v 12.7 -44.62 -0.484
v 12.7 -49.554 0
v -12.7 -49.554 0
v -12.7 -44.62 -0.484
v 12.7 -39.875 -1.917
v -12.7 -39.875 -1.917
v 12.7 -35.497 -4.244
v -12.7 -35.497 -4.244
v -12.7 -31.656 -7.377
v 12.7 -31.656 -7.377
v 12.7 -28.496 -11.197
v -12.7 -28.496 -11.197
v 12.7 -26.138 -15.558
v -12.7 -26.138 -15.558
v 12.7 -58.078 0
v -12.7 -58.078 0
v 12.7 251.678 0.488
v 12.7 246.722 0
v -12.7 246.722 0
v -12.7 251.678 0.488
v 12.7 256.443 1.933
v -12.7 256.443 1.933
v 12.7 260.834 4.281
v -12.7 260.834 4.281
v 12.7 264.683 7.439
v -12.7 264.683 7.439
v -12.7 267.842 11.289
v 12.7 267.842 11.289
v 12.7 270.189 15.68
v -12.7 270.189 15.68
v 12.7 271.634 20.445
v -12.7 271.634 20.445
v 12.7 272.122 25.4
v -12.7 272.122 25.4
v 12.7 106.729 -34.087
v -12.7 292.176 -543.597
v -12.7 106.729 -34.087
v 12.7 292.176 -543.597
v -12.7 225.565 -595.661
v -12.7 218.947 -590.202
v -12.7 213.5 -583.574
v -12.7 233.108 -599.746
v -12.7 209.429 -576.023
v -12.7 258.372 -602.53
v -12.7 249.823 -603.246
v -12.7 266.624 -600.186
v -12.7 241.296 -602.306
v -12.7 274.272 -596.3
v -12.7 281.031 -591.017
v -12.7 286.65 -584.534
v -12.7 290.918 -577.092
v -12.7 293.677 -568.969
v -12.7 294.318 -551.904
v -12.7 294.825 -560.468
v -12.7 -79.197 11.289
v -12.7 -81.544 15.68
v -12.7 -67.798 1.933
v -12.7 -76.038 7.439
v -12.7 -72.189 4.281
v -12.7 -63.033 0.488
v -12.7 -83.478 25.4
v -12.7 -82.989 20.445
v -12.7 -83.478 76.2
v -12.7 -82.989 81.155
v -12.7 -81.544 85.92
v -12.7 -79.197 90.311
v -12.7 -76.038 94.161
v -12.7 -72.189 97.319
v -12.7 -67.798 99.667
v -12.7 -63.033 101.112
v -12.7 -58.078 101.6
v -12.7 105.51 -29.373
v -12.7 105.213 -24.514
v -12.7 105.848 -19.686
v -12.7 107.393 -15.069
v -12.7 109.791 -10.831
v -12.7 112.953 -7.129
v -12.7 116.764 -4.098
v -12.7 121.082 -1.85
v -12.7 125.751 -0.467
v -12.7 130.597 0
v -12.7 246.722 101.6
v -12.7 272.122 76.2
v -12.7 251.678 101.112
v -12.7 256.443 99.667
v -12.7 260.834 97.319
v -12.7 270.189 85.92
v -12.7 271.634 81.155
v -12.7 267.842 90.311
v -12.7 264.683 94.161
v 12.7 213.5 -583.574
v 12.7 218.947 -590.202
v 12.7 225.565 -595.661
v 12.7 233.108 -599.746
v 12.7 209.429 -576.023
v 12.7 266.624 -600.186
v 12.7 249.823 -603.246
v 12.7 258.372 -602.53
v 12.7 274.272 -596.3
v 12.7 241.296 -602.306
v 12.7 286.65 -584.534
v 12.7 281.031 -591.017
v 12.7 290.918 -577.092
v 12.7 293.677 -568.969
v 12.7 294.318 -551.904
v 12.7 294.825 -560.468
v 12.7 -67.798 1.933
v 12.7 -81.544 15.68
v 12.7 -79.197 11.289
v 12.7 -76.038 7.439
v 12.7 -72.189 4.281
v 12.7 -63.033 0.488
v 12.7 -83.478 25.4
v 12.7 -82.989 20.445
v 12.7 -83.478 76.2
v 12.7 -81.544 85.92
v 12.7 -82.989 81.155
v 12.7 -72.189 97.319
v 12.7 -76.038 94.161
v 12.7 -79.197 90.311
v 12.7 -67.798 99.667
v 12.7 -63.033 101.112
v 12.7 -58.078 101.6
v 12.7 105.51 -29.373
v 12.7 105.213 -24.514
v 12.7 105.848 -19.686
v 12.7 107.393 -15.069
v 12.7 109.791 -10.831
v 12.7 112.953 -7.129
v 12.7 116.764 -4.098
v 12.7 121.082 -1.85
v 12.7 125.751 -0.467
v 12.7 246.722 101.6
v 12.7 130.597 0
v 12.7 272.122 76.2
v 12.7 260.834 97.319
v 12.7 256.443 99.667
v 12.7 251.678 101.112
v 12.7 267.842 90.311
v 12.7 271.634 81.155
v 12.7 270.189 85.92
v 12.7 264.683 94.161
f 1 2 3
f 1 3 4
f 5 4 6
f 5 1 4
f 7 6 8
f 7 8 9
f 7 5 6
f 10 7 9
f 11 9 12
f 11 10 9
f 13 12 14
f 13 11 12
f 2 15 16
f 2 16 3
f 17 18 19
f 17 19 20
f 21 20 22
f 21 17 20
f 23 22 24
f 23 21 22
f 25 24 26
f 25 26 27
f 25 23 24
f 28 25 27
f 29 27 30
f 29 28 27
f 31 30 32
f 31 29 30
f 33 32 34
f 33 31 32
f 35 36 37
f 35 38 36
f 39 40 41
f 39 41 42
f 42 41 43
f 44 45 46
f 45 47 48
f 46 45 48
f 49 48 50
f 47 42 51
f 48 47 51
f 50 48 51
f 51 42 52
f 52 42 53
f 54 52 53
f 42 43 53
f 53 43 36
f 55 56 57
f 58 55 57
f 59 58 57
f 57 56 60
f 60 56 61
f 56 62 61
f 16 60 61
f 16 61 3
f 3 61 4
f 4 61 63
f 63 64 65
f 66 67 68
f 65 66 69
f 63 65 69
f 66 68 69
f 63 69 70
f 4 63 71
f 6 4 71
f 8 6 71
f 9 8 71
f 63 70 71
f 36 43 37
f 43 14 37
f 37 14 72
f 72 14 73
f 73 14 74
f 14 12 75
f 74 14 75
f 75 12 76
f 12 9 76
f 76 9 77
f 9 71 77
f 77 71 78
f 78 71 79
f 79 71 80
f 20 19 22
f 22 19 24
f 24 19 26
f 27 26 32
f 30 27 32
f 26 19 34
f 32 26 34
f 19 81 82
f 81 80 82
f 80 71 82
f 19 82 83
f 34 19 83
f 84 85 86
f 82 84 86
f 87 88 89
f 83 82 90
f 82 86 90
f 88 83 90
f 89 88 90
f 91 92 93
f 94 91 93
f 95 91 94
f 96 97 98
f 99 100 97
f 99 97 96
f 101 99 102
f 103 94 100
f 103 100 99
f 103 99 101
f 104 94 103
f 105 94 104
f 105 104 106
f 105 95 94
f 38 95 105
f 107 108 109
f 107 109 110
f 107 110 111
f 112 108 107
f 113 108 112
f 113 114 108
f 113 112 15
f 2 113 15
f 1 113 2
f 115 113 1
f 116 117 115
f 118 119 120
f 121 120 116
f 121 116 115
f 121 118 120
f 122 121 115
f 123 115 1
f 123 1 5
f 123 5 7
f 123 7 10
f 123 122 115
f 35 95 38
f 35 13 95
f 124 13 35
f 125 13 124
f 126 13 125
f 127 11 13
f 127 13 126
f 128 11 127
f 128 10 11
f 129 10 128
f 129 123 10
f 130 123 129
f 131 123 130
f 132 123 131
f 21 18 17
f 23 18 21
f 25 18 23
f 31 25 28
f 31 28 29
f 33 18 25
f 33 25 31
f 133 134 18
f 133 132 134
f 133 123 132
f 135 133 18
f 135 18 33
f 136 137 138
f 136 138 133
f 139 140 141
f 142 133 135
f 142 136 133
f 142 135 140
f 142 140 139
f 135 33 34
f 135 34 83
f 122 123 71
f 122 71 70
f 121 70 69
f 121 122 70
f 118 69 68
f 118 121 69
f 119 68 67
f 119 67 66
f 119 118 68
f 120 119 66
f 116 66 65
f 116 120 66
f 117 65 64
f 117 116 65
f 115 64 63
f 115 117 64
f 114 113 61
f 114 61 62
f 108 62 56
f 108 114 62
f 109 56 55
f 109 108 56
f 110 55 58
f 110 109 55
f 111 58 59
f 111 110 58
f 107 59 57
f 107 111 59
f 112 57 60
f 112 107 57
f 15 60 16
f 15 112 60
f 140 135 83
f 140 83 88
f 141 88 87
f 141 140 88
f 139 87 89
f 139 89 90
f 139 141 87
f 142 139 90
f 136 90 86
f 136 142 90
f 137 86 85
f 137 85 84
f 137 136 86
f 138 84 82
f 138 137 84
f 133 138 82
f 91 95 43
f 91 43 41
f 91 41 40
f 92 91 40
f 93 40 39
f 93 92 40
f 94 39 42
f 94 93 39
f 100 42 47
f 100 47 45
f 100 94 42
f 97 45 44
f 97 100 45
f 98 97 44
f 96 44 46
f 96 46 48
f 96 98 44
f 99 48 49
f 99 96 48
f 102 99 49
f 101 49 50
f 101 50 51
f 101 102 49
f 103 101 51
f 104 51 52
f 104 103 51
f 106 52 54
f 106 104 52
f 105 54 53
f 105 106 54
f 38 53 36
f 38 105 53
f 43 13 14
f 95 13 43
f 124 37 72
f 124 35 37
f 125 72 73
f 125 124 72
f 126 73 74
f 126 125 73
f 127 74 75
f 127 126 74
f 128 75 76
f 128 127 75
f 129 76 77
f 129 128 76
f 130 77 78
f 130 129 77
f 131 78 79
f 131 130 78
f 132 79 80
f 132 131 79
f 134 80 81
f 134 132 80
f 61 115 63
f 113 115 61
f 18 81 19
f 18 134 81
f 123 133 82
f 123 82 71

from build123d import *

# Parameters (mm, degrees)
F1_DEPTH = 12.7


with BuildPart() as f1:
    # F0 (on Right) → F1 (new body, symmetric)
    with BuildSketch(Plane.YZ):
        with BuildLine():
            Line((130.597452, 0), (246.722493, 0))
            ThreePointArc((246.722493, 0), (264.683005, 7.439488), (272.122493, 25.4))
            Line((272.122493, 25.4), (272.122493, 76.2))
            ThreePointArc((272.122493, 76.2), (264.683005, 94.160512), (246.722493, 101.6))
            Line((246.722493, 101.6), (-58.077507, 101.6))
            ThreePointArc((-58.077507, 101.6), (-76.038019, 94.160512), (-83.477507, 76.2))
            Line((-83.477507, 76.2), (-83.477507, 25.4))
            ThreePointArc((-83.477507, 25.4), (-76.038019, 7.439488), (-58.077507, 0))
            Line((-58.077507, 0), (-49.55408, 0))
            ThreePointArc((-49.55408, 0), (-35.497441, -4.244128), (-26.138297, -15.558196))
            Line((-26.138297, -15.558196), (209.428738, -576.023158))
            ThreePointArc((209.428738, -576.023158), (266.624167, -600.185809), (292.175695, -543.597205))
            Line((292.175695, -543.597205), (106.72926, -34.087312))
            ThreePointArc((106.72926, -34.087312), (109.790991, -10.831159), (130.597452, 0))
        make_face()
    extrude(amount=F1_DEPTH, both=True)


solid = f1.part
